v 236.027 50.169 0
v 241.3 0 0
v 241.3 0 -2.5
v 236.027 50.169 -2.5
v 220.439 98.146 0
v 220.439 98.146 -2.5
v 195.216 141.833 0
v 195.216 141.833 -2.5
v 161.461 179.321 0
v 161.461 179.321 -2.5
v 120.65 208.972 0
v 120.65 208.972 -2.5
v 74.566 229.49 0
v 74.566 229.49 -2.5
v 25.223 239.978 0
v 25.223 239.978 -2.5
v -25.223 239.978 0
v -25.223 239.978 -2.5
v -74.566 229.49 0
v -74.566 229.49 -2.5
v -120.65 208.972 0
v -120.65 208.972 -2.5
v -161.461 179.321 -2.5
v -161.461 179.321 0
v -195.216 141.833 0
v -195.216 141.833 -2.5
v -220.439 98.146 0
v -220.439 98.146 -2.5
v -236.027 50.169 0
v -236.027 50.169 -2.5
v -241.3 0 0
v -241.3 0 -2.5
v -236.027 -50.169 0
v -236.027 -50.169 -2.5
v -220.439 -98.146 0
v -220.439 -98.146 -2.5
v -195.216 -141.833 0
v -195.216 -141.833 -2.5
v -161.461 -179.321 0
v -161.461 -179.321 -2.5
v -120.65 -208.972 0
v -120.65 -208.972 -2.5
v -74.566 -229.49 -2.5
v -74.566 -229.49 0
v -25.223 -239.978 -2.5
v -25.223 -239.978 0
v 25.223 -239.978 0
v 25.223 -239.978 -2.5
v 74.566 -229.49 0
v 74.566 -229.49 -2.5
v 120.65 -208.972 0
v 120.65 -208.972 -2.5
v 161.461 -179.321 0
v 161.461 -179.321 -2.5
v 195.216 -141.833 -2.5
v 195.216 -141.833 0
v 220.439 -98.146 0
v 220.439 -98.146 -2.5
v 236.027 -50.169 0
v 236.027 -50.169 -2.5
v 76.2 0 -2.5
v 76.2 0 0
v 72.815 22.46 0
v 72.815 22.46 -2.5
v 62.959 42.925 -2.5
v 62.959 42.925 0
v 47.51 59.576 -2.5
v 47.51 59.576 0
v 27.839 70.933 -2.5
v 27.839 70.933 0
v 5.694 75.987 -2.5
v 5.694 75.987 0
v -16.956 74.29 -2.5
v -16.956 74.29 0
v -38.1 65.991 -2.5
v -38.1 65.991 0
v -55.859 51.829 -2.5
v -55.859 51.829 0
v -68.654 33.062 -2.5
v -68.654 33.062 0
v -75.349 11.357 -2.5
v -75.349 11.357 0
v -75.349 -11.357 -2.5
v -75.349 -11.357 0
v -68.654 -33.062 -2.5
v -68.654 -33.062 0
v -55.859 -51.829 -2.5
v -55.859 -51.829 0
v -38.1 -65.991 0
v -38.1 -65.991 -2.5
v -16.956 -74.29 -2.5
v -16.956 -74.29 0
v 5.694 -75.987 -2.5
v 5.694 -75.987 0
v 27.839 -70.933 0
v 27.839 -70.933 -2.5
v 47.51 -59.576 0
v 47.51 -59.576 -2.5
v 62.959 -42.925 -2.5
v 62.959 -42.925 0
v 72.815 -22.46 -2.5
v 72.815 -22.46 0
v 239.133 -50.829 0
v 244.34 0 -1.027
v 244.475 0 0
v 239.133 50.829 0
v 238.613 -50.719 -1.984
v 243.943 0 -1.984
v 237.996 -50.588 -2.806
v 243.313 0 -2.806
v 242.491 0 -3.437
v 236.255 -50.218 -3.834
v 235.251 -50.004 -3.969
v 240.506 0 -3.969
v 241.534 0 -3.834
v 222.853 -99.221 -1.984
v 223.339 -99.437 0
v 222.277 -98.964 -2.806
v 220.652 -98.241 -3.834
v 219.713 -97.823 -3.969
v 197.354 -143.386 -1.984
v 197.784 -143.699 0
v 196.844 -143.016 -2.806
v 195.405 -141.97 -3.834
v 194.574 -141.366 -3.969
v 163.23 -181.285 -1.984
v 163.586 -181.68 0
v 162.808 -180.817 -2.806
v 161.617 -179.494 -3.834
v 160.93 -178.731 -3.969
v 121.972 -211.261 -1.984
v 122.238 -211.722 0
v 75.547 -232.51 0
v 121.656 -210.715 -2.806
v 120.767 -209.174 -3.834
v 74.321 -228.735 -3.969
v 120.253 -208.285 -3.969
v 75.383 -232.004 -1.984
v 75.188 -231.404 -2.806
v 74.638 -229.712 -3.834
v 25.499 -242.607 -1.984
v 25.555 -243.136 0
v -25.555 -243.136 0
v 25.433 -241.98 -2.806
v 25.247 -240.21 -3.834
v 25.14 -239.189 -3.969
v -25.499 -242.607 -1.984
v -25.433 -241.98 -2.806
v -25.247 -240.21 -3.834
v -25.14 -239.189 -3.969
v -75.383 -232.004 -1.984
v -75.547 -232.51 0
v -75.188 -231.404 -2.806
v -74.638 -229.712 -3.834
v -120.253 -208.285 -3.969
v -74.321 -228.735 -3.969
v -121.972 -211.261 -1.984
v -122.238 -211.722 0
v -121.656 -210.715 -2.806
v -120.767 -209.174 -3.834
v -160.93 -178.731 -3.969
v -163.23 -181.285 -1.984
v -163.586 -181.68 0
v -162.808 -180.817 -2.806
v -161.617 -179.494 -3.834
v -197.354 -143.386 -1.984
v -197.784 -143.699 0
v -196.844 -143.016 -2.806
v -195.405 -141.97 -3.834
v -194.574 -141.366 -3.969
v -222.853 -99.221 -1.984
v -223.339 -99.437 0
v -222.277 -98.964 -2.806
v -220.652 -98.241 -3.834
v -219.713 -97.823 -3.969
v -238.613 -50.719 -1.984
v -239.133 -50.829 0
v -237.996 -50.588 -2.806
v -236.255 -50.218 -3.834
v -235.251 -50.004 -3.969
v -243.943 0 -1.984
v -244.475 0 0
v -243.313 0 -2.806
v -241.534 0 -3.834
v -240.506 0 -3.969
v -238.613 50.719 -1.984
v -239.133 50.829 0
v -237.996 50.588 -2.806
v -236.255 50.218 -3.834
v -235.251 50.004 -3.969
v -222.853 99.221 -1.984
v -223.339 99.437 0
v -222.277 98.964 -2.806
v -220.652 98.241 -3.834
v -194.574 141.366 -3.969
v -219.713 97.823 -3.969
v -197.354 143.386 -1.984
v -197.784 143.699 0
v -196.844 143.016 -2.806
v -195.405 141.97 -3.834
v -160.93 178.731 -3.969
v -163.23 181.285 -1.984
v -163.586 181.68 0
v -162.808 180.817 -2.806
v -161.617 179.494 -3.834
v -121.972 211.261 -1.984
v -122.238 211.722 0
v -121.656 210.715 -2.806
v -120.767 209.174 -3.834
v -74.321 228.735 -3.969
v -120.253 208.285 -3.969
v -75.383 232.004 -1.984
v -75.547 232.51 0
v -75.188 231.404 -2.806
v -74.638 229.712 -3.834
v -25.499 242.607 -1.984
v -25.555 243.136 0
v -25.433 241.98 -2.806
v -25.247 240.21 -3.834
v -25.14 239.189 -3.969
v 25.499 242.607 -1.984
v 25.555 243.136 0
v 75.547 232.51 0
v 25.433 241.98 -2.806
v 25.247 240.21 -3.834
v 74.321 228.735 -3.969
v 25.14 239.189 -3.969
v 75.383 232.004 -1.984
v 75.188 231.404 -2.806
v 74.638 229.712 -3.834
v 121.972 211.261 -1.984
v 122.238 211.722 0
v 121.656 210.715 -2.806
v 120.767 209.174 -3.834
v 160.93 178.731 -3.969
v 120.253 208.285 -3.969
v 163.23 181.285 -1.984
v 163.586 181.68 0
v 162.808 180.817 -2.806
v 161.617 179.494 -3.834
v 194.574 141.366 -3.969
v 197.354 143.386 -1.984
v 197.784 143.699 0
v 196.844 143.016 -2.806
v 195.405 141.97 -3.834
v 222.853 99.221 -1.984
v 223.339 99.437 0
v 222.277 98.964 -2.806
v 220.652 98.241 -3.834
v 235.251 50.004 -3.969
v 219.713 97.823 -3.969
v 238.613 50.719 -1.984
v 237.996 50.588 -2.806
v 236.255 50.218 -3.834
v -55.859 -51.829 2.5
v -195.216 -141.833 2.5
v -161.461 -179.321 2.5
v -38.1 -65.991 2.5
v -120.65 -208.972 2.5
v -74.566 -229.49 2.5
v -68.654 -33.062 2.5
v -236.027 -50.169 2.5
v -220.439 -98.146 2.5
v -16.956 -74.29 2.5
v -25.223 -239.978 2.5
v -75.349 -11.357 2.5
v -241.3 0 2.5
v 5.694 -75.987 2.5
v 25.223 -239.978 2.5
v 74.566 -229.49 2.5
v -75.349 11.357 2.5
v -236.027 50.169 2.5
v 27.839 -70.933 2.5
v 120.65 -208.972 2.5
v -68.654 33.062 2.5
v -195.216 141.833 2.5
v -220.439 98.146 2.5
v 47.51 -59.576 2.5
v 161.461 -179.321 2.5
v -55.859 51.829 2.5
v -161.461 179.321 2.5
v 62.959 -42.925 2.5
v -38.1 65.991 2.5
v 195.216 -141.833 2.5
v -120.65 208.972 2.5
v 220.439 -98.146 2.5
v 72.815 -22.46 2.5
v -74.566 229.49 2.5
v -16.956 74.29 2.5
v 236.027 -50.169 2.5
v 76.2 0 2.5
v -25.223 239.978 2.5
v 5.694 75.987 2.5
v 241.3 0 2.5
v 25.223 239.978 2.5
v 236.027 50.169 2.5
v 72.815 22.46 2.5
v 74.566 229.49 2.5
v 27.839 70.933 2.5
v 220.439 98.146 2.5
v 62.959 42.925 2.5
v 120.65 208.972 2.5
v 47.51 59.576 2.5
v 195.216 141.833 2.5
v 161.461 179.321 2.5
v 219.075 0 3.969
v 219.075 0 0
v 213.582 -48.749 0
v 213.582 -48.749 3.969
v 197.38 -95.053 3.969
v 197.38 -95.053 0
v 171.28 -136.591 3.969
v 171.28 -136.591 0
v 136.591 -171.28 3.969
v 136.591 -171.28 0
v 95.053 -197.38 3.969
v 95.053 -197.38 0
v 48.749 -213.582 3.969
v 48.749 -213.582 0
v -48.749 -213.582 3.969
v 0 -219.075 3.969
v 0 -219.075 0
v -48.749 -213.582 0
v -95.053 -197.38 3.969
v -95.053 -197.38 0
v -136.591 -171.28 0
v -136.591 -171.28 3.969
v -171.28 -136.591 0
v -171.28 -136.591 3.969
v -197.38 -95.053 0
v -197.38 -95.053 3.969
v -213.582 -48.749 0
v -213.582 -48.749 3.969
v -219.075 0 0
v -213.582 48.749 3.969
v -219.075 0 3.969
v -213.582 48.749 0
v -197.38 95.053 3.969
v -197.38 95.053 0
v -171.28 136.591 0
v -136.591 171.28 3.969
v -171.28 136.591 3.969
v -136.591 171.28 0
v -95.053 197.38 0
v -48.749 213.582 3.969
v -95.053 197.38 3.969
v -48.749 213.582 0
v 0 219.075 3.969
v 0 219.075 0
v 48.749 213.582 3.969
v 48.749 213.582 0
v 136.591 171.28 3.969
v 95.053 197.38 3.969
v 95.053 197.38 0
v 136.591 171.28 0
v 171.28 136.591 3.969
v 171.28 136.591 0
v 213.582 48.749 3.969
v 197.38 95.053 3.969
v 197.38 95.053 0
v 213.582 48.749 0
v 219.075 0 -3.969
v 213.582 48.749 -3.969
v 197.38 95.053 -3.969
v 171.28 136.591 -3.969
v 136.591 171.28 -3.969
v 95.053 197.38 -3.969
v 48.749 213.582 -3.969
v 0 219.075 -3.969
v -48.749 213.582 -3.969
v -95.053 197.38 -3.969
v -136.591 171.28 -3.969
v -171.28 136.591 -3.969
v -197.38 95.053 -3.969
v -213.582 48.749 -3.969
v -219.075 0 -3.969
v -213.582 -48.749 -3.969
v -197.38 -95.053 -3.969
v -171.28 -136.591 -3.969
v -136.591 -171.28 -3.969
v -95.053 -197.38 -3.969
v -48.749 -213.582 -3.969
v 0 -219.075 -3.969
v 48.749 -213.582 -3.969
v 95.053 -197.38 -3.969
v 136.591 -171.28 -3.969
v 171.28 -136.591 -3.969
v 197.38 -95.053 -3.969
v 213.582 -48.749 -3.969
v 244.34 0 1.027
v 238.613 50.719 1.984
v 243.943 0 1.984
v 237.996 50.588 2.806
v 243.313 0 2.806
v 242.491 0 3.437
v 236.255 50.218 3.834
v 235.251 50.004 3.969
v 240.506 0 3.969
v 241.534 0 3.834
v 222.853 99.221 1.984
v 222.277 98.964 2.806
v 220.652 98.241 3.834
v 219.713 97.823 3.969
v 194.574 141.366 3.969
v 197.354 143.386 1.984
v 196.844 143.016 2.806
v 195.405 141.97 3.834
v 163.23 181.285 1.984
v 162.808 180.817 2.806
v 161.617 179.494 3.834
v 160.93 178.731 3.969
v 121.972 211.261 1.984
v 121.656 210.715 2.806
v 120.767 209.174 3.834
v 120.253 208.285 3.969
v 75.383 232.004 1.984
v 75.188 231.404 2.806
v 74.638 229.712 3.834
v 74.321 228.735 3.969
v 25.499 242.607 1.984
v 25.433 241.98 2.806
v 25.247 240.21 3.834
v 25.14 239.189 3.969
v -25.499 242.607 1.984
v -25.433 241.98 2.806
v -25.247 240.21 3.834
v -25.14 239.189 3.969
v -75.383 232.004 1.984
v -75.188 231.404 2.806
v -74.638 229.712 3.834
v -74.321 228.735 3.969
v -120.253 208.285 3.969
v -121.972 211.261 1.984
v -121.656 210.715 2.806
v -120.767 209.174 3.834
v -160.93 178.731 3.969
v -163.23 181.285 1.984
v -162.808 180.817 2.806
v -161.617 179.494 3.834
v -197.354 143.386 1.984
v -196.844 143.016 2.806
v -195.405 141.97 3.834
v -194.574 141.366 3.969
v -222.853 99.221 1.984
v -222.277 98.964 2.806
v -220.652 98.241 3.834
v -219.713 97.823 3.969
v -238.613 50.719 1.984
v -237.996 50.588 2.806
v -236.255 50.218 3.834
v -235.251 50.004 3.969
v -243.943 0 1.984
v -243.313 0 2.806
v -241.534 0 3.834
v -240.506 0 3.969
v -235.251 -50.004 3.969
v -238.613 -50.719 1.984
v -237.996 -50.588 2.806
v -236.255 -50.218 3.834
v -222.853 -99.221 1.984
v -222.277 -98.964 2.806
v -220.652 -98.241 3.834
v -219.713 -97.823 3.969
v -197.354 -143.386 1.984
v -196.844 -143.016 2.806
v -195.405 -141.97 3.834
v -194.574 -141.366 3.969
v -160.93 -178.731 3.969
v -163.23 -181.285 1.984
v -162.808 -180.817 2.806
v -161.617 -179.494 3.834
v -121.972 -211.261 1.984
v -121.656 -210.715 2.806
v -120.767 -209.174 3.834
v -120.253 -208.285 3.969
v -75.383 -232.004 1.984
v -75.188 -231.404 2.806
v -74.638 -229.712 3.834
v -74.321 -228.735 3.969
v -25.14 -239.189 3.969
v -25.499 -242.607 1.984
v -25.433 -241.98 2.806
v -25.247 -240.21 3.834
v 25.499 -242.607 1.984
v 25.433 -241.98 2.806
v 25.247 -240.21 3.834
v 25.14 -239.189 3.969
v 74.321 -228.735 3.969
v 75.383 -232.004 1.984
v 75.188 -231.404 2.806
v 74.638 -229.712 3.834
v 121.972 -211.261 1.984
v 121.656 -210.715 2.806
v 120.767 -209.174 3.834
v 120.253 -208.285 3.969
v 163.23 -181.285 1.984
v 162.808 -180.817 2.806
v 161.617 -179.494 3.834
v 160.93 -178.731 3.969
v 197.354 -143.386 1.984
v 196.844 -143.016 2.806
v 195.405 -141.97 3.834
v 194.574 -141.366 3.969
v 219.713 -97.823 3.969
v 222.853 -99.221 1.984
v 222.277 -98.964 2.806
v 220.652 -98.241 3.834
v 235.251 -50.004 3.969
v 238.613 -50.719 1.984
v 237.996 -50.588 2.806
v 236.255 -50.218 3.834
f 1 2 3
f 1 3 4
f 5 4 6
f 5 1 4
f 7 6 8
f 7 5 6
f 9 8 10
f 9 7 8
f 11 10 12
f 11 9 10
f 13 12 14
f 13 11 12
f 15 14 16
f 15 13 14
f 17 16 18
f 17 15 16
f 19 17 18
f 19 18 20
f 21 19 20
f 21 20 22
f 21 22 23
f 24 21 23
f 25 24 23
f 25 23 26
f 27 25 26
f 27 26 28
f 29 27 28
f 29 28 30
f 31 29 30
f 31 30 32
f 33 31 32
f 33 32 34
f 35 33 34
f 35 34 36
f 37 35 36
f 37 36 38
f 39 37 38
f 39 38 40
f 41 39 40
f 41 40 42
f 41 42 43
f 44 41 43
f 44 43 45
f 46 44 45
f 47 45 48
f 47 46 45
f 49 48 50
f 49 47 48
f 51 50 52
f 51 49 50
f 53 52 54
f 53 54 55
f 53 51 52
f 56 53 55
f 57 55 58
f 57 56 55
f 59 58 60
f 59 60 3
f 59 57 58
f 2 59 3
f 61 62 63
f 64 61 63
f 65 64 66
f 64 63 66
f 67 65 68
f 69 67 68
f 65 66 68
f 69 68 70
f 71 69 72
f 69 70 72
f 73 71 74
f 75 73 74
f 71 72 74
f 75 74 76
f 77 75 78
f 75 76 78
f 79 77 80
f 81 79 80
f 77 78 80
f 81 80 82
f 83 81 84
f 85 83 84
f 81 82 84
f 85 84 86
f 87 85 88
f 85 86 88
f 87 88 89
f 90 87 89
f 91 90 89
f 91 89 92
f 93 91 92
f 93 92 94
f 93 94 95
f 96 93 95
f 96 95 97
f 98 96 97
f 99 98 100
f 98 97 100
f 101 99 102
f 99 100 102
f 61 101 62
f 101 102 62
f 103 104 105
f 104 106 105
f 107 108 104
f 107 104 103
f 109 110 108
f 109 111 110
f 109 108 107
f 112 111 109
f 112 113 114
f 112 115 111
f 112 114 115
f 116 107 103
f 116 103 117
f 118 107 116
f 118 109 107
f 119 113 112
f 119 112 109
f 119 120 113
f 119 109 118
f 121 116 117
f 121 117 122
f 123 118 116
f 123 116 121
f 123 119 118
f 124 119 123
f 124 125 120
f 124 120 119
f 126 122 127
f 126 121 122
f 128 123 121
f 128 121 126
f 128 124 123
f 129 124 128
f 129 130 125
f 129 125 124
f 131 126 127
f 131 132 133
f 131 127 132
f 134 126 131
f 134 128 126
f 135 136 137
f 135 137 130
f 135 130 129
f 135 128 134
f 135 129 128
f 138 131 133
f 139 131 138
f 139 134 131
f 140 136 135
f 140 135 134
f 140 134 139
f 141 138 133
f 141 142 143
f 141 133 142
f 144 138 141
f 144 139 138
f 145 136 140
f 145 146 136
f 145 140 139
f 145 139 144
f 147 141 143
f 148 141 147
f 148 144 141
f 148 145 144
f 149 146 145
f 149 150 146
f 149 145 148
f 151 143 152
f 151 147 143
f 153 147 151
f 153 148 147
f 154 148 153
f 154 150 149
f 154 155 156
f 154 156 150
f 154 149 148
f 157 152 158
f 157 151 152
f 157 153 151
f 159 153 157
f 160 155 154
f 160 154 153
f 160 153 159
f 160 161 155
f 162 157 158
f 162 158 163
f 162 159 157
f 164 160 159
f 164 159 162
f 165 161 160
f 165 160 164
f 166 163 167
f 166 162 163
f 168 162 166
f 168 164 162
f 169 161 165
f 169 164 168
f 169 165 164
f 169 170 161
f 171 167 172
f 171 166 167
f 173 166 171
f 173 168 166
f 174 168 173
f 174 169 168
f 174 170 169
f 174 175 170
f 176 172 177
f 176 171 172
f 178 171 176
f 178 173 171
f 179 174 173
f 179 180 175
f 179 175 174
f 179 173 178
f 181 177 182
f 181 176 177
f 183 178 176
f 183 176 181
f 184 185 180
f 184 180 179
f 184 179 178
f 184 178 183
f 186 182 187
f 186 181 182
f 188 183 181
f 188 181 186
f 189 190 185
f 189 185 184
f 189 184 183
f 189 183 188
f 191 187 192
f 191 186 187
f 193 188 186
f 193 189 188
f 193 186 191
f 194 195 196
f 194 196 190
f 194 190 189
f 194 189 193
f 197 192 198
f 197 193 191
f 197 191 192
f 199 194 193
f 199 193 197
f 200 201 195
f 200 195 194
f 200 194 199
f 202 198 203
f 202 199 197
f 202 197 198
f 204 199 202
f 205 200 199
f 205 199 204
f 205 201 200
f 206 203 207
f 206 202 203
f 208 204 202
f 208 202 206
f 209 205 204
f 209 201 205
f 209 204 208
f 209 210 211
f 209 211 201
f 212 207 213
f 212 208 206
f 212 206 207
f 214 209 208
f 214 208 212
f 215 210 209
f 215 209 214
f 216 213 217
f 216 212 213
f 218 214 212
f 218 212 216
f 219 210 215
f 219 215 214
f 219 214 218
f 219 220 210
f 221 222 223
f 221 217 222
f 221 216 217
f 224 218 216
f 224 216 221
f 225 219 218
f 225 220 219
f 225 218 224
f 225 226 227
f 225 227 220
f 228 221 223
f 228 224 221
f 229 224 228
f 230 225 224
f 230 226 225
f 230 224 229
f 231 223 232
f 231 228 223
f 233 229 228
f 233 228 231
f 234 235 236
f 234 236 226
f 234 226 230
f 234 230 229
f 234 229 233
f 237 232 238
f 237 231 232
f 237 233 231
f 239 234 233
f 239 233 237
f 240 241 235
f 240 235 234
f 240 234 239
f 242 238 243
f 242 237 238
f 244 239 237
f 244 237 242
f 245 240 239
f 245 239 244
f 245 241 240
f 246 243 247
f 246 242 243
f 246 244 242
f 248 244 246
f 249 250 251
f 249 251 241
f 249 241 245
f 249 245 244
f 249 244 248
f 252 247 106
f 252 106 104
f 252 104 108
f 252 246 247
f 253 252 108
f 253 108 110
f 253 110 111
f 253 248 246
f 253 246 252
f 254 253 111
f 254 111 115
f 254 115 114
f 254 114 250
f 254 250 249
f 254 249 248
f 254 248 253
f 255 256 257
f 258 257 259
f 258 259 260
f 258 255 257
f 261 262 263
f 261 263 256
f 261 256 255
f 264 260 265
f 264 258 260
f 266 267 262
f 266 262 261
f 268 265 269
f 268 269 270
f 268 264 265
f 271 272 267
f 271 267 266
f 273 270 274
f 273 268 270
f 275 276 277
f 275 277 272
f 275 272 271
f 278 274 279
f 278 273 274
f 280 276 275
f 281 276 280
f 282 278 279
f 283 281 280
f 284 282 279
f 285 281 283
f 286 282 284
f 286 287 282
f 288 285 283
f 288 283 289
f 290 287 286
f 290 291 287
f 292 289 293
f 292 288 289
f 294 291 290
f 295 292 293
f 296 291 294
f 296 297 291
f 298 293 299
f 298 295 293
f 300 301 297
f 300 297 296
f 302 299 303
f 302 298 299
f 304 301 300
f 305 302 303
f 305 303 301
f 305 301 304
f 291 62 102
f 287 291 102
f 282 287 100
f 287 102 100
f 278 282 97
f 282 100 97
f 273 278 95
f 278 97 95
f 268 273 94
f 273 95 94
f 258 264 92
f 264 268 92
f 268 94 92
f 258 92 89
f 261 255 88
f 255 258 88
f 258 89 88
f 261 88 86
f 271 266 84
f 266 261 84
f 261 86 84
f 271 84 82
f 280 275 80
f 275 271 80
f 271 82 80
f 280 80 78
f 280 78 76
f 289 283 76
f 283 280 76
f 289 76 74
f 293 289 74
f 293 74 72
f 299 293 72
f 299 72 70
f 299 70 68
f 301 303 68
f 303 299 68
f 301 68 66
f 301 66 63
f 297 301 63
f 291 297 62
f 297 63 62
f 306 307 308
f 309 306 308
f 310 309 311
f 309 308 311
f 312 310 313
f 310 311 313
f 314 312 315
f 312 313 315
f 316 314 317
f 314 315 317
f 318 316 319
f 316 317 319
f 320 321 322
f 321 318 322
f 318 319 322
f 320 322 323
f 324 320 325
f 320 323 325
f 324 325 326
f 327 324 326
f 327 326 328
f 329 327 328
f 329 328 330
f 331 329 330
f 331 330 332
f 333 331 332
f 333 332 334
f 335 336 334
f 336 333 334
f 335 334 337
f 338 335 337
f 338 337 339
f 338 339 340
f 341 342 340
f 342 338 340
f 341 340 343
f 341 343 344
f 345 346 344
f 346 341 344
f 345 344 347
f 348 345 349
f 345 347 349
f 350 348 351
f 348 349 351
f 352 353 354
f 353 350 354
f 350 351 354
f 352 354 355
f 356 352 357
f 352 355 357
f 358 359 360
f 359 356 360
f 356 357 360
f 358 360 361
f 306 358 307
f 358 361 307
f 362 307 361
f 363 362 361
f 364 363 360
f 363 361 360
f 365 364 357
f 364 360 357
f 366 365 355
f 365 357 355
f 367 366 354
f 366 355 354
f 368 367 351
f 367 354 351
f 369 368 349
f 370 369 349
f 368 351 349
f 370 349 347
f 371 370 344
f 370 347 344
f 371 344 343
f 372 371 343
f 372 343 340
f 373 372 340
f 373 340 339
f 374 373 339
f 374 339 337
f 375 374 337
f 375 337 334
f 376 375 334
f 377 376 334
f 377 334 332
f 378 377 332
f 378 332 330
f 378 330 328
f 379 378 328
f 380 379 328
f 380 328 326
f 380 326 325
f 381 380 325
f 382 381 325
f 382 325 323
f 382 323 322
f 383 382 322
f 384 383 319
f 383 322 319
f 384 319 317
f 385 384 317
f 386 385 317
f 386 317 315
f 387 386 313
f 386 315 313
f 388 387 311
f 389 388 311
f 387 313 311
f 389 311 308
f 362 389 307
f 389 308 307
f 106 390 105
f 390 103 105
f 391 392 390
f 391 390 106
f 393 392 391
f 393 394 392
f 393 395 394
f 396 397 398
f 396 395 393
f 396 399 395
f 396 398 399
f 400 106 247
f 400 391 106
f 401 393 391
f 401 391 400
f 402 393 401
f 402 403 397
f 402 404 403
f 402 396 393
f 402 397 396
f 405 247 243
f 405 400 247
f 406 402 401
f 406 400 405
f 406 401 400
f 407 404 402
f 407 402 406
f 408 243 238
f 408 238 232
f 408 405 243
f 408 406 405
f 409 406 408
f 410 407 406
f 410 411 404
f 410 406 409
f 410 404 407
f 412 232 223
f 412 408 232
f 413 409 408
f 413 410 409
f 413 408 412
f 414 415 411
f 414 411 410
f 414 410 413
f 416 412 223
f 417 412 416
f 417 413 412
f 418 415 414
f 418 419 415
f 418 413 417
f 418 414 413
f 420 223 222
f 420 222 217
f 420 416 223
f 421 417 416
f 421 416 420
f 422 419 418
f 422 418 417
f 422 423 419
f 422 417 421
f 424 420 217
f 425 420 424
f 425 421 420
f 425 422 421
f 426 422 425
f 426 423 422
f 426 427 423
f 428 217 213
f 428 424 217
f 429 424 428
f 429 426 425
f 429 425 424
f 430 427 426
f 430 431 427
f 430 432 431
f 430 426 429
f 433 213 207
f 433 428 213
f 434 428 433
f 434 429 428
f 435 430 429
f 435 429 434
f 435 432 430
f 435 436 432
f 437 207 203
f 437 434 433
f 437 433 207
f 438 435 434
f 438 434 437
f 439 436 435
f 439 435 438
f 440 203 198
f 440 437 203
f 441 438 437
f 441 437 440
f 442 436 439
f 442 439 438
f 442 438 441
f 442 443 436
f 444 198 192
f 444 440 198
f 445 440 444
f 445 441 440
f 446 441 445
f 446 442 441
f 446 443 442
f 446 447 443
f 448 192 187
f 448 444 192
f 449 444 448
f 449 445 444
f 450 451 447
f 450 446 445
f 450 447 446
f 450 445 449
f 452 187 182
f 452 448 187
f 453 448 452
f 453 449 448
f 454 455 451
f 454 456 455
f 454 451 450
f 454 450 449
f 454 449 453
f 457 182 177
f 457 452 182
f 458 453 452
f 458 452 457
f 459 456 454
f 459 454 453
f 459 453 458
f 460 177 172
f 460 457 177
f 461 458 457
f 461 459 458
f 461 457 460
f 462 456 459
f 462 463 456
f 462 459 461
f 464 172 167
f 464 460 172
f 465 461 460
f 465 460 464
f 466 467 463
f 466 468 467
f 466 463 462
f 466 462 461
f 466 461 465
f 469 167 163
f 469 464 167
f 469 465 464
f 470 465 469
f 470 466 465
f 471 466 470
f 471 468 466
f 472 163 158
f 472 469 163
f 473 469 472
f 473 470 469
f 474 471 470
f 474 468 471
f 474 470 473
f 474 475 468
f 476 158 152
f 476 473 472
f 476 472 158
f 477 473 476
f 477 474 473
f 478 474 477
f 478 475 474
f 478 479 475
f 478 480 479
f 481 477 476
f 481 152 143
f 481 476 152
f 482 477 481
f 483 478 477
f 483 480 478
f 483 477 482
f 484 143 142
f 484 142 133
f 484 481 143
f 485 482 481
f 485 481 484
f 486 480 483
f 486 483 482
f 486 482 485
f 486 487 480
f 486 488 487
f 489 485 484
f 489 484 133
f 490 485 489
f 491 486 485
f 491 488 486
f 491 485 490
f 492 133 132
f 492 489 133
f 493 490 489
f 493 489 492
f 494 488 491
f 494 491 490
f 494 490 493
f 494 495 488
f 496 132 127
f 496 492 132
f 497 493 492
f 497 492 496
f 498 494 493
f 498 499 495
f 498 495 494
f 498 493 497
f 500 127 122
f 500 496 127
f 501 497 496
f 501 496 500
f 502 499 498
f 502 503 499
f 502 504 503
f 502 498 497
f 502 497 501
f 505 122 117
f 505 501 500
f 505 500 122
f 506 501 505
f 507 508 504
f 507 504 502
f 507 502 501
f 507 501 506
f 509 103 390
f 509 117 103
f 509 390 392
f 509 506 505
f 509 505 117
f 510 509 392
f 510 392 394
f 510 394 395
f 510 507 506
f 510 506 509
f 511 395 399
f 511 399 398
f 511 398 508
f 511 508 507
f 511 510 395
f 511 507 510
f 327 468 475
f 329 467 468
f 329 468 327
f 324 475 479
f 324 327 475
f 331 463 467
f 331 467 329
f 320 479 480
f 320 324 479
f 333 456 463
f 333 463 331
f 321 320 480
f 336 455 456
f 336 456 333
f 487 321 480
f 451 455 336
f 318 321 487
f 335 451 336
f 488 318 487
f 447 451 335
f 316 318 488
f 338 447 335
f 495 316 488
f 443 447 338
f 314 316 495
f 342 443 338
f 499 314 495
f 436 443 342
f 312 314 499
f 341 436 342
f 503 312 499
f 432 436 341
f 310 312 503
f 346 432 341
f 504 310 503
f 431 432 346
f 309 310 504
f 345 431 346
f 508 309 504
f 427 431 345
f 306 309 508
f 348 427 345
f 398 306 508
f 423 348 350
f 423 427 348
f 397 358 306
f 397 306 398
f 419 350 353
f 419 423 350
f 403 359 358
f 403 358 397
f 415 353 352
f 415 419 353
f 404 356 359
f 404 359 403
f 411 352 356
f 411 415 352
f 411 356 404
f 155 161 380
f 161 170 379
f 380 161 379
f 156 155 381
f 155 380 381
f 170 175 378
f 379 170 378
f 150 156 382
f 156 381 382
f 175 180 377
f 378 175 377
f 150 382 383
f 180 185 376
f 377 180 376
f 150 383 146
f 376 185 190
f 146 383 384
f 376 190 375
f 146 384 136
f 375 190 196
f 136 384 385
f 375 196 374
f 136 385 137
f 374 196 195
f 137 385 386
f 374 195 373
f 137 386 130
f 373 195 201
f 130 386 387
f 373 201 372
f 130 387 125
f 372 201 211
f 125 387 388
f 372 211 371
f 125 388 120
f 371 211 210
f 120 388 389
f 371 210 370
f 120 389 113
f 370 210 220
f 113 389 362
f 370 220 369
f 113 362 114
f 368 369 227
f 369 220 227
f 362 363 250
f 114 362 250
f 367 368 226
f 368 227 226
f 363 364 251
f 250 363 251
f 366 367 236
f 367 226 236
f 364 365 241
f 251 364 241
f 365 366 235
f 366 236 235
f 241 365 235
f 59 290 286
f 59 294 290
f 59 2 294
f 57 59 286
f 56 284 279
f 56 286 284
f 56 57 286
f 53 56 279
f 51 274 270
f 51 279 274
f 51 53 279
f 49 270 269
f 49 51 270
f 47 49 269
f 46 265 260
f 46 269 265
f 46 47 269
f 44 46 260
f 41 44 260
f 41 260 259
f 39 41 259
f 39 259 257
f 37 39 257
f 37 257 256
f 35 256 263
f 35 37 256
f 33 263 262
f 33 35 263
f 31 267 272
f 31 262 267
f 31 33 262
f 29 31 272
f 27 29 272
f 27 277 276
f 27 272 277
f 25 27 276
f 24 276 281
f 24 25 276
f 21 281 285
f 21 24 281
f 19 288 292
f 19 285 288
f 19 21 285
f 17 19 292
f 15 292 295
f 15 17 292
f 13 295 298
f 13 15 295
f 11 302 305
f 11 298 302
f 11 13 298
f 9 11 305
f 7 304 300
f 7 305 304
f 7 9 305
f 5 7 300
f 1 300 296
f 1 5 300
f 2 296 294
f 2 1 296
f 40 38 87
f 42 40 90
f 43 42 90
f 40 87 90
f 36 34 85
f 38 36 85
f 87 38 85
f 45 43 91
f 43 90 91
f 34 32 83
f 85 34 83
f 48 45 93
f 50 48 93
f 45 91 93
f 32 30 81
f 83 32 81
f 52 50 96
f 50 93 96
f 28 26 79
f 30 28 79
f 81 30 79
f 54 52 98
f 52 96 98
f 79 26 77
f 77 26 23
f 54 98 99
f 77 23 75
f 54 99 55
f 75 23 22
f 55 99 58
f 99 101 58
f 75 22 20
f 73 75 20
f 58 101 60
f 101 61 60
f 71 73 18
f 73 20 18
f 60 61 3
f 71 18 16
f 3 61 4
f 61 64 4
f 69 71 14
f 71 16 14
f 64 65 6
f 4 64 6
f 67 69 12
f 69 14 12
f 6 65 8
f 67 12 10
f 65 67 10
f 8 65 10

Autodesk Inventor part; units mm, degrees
ref_plane "YZ Plane" through (0, 0, 0) normal (1, 0, 0) x (0, 1, 0)
ref_plane "XZ Plane" through (0, 0, 0) normal (0, 1, 0) x (-1, 0, 0)
ref_plane "XY Plane" through (0, 0, 0) normal (0, 0, 1) x (1, 0, 0)
sketch "Sketch1" plane through (0, 0, 0) normal (0, 0, 1) x (1, 0, 0)
  circle A0 centre (0, 0) radius 76.2
  circle A1 centre (0, 0) radius 241.3
  dimension "d0" = 152.4
  dimension "d1" = 482.6
extrude "Plate1" add sketch "Sketch1" along normal mid plane 5
sketch "Sketch2" plane through (0, 0, 0) normal (0, 0, 1) x (1, 0, 0)
  circle A0 centre (0, 0) radius 244.475
  circle A1 centre (0, 0) radius 219.075
  dimension "d3" = 488.95
  dimension "d4" = 25.4
extrude "Extrusion1" add sketch "Sketch2" along normal mid plane 7.9375 separate body
full round fillet "Fillet1" bodies 2 first side at (3.4747, -235.7615, 3.9688) centre faces at (244.0374, -14.6206, 1.3229) (244.0374, -14.6206, -1.3229) second side at (3.4747, -235.7615, -3.9688)
equation "\"d2\" = Thickness"
equation "\"BendRadius\" = Thickness"
equation "\"BendReliefWidth\" = Thickness"
equation "\"BendReliefDepth\" = 0.5 * Thickness"
equation "\"TransitionRadius\" = BendRadius"
equation "\"JacobiRadiusSize\" = BendRadius"
equation "\"GapSize\" = Thickness"
equation "\"Thickness\" = 5"
properties part number "Disc" material "Polycarbonate, Clear"
